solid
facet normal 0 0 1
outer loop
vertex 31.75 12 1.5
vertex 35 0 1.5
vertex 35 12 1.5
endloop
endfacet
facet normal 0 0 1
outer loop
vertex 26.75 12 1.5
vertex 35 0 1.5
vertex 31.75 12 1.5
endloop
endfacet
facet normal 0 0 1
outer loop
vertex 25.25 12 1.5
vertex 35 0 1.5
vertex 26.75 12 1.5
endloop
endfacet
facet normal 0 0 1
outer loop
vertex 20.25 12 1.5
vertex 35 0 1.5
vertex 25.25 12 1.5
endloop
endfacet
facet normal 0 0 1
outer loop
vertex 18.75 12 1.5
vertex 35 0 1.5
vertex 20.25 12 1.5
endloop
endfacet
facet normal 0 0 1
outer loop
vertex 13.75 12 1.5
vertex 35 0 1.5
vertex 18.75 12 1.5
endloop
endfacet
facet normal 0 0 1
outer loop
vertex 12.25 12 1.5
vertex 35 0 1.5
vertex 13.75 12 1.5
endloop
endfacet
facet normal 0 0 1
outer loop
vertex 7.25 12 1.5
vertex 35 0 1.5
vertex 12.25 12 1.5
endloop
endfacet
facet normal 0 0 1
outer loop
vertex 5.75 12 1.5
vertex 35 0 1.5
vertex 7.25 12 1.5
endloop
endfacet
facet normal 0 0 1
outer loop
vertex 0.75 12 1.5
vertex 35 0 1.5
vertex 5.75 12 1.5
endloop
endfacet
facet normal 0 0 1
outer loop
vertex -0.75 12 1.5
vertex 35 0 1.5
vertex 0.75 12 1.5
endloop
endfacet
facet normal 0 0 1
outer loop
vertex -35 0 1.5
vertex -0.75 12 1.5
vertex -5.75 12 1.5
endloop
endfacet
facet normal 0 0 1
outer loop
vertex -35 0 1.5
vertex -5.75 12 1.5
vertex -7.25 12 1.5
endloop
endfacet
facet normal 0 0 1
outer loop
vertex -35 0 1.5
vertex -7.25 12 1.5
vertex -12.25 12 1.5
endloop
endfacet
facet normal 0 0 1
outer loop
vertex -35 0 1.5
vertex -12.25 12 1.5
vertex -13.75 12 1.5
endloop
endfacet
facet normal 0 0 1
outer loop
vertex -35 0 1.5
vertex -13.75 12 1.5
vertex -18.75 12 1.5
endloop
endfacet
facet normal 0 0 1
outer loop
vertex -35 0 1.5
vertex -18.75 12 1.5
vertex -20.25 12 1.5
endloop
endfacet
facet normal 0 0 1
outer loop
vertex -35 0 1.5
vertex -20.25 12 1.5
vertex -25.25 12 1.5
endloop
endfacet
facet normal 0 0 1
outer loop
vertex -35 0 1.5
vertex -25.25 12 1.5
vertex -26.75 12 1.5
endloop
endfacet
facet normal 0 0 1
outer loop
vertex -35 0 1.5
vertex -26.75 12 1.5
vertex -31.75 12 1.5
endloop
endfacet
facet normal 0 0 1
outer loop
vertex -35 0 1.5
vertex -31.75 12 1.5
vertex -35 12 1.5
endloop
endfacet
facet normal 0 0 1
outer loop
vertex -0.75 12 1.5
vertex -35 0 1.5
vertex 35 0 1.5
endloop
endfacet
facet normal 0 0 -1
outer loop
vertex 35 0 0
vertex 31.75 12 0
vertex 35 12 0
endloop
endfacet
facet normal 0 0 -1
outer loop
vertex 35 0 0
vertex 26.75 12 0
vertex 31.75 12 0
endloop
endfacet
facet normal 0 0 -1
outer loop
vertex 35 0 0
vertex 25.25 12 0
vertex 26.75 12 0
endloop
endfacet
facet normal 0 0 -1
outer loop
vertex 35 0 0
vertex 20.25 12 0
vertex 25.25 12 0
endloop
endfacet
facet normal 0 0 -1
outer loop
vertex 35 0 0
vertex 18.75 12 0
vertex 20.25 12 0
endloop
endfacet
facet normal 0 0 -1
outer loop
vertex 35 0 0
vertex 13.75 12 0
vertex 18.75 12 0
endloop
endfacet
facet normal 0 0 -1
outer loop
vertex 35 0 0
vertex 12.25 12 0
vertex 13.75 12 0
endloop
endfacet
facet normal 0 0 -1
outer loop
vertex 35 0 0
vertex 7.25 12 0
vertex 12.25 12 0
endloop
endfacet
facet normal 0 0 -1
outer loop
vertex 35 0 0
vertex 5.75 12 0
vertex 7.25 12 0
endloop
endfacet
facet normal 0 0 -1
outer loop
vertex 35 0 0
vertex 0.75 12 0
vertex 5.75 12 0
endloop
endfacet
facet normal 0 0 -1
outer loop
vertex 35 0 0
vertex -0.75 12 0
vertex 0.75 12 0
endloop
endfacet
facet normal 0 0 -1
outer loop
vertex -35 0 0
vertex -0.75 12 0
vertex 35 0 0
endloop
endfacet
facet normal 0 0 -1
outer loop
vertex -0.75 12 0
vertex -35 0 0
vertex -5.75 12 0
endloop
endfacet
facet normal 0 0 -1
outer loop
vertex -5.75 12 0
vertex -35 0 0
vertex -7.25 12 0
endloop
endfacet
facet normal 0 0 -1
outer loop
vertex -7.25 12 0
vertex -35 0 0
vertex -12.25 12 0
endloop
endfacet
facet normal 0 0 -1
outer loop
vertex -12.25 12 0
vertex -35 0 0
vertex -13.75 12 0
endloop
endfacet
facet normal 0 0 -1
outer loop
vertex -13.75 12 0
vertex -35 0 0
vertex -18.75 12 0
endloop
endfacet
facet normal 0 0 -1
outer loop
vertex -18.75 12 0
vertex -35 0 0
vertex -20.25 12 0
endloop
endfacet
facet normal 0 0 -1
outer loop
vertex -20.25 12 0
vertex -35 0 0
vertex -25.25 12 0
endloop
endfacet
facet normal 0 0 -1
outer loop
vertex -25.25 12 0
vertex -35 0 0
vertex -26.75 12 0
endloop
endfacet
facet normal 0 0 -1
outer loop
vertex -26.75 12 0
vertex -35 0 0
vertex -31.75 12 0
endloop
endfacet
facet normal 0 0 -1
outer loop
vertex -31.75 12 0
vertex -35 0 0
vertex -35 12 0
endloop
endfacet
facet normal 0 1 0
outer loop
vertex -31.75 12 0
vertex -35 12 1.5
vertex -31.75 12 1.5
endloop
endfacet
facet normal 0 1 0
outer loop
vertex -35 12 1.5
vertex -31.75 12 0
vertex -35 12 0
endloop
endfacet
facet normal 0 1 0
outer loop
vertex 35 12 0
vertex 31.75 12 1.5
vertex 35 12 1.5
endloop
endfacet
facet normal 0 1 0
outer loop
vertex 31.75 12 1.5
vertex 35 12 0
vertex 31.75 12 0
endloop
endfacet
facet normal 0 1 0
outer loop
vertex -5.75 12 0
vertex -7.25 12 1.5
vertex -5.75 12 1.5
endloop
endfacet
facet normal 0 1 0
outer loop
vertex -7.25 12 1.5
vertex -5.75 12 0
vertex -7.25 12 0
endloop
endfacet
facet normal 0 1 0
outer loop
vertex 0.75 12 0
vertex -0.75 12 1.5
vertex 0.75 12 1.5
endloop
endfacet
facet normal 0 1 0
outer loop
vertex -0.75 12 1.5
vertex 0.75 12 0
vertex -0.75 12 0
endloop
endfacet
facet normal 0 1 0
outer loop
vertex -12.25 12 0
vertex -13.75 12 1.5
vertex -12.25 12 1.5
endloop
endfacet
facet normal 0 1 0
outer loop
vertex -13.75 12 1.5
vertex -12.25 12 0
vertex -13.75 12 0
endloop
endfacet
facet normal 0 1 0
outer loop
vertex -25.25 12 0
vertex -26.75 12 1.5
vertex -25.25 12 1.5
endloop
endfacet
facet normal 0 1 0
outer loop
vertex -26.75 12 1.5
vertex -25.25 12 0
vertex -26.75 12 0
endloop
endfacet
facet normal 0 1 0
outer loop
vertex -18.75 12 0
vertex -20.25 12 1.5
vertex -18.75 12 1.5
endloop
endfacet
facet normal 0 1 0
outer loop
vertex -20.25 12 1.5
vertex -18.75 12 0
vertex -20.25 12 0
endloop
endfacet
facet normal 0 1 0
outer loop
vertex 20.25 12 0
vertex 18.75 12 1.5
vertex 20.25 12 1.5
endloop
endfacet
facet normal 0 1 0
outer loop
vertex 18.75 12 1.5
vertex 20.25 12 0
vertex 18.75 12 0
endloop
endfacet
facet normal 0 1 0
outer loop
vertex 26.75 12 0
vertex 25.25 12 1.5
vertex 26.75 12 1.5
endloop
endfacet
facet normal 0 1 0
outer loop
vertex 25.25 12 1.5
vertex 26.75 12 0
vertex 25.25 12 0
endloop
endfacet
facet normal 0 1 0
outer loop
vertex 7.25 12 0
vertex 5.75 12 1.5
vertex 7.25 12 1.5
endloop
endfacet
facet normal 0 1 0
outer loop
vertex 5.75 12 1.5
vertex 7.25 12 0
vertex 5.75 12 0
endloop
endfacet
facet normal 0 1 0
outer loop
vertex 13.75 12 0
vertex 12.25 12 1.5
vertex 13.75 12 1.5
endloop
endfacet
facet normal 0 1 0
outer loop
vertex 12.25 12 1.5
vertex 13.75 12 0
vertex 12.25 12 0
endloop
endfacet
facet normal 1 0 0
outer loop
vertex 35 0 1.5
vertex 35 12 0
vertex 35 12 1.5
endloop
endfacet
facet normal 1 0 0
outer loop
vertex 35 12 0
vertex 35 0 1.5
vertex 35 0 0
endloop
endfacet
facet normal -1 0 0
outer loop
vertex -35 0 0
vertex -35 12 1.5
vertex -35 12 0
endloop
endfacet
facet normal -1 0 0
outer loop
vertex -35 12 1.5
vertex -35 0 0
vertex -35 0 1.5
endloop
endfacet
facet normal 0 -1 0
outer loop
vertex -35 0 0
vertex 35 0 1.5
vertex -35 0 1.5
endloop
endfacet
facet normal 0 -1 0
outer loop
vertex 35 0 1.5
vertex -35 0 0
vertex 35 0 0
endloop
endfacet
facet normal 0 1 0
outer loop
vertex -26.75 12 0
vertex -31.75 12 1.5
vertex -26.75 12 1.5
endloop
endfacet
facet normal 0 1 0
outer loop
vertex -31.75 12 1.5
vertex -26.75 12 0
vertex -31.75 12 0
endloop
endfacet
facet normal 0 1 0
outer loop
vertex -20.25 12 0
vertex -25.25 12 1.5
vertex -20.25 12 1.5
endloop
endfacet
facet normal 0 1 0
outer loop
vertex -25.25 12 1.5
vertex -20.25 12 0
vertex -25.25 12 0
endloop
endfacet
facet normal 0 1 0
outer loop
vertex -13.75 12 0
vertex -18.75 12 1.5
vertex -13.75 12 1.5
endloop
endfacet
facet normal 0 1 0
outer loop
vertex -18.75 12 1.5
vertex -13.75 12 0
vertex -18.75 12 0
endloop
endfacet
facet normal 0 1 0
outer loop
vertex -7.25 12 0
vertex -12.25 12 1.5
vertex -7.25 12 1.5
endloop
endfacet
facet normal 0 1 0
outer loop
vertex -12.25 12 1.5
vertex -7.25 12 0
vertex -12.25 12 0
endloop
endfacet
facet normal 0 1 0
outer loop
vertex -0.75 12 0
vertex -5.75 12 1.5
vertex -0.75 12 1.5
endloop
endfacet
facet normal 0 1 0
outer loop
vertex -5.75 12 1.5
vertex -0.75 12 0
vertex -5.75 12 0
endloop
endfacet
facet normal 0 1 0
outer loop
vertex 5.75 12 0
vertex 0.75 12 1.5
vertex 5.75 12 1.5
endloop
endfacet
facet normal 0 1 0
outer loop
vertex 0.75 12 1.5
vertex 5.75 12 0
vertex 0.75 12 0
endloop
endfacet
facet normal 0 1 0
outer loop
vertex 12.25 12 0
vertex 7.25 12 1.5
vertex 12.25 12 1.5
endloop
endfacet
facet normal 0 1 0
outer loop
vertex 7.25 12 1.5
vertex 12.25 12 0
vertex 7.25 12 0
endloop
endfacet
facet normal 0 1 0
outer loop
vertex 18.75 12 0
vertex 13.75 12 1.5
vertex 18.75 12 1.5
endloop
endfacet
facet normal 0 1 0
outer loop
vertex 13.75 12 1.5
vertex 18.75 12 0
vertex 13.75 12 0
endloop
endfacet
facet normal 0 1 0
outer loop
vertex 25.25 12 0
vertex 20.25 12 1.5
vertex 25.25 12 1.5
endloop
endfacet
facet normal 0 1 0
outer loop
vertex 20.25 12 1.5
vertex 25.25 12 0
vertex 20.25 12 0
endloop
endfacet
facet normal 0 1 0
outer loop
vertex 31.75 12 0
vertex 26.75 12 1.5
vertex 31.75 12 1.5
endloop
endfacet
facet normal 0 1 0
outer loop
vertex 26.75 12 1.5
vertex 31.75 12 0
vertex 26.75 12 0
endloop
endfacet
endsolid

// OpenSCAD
// Agarose gel comb - a flat plate with a back bar and a row of rectangular teeth for casting
// horizontal gels. NOVEL general part, printed lying flat on the bed.
//

teeth = 10;
bar_L = 70;
bar_W = 12;
t     = 1.5;
tooth_W = 5.0;
tooth_L = 12;
gap    = 1.5;

$fn = 48;

teeth_X = tooth_W * teeth + (teeth - 1) * gap;

difference() {
    union() {
        translate([-bar_L / 2, 0, 0]) cube([bar_L, bar_W, t]);                 // back bar
        for (i = [0 : teeth - 1])
            translate([-(teeth_X / 2) + i * (tooth_W + gap), bar_W, 0])
                cube([tooth_W, tooth_L, t]);                                  // teeth
    }
    for (i = [0 : teeth - 1])
        translate([-(teeth_X / 2) + i * (tooth_W + gap), bar_W, 0])
            cube([tooth_W, tooth_L + 1, t]);                                 // empty the tooth cavities
}
